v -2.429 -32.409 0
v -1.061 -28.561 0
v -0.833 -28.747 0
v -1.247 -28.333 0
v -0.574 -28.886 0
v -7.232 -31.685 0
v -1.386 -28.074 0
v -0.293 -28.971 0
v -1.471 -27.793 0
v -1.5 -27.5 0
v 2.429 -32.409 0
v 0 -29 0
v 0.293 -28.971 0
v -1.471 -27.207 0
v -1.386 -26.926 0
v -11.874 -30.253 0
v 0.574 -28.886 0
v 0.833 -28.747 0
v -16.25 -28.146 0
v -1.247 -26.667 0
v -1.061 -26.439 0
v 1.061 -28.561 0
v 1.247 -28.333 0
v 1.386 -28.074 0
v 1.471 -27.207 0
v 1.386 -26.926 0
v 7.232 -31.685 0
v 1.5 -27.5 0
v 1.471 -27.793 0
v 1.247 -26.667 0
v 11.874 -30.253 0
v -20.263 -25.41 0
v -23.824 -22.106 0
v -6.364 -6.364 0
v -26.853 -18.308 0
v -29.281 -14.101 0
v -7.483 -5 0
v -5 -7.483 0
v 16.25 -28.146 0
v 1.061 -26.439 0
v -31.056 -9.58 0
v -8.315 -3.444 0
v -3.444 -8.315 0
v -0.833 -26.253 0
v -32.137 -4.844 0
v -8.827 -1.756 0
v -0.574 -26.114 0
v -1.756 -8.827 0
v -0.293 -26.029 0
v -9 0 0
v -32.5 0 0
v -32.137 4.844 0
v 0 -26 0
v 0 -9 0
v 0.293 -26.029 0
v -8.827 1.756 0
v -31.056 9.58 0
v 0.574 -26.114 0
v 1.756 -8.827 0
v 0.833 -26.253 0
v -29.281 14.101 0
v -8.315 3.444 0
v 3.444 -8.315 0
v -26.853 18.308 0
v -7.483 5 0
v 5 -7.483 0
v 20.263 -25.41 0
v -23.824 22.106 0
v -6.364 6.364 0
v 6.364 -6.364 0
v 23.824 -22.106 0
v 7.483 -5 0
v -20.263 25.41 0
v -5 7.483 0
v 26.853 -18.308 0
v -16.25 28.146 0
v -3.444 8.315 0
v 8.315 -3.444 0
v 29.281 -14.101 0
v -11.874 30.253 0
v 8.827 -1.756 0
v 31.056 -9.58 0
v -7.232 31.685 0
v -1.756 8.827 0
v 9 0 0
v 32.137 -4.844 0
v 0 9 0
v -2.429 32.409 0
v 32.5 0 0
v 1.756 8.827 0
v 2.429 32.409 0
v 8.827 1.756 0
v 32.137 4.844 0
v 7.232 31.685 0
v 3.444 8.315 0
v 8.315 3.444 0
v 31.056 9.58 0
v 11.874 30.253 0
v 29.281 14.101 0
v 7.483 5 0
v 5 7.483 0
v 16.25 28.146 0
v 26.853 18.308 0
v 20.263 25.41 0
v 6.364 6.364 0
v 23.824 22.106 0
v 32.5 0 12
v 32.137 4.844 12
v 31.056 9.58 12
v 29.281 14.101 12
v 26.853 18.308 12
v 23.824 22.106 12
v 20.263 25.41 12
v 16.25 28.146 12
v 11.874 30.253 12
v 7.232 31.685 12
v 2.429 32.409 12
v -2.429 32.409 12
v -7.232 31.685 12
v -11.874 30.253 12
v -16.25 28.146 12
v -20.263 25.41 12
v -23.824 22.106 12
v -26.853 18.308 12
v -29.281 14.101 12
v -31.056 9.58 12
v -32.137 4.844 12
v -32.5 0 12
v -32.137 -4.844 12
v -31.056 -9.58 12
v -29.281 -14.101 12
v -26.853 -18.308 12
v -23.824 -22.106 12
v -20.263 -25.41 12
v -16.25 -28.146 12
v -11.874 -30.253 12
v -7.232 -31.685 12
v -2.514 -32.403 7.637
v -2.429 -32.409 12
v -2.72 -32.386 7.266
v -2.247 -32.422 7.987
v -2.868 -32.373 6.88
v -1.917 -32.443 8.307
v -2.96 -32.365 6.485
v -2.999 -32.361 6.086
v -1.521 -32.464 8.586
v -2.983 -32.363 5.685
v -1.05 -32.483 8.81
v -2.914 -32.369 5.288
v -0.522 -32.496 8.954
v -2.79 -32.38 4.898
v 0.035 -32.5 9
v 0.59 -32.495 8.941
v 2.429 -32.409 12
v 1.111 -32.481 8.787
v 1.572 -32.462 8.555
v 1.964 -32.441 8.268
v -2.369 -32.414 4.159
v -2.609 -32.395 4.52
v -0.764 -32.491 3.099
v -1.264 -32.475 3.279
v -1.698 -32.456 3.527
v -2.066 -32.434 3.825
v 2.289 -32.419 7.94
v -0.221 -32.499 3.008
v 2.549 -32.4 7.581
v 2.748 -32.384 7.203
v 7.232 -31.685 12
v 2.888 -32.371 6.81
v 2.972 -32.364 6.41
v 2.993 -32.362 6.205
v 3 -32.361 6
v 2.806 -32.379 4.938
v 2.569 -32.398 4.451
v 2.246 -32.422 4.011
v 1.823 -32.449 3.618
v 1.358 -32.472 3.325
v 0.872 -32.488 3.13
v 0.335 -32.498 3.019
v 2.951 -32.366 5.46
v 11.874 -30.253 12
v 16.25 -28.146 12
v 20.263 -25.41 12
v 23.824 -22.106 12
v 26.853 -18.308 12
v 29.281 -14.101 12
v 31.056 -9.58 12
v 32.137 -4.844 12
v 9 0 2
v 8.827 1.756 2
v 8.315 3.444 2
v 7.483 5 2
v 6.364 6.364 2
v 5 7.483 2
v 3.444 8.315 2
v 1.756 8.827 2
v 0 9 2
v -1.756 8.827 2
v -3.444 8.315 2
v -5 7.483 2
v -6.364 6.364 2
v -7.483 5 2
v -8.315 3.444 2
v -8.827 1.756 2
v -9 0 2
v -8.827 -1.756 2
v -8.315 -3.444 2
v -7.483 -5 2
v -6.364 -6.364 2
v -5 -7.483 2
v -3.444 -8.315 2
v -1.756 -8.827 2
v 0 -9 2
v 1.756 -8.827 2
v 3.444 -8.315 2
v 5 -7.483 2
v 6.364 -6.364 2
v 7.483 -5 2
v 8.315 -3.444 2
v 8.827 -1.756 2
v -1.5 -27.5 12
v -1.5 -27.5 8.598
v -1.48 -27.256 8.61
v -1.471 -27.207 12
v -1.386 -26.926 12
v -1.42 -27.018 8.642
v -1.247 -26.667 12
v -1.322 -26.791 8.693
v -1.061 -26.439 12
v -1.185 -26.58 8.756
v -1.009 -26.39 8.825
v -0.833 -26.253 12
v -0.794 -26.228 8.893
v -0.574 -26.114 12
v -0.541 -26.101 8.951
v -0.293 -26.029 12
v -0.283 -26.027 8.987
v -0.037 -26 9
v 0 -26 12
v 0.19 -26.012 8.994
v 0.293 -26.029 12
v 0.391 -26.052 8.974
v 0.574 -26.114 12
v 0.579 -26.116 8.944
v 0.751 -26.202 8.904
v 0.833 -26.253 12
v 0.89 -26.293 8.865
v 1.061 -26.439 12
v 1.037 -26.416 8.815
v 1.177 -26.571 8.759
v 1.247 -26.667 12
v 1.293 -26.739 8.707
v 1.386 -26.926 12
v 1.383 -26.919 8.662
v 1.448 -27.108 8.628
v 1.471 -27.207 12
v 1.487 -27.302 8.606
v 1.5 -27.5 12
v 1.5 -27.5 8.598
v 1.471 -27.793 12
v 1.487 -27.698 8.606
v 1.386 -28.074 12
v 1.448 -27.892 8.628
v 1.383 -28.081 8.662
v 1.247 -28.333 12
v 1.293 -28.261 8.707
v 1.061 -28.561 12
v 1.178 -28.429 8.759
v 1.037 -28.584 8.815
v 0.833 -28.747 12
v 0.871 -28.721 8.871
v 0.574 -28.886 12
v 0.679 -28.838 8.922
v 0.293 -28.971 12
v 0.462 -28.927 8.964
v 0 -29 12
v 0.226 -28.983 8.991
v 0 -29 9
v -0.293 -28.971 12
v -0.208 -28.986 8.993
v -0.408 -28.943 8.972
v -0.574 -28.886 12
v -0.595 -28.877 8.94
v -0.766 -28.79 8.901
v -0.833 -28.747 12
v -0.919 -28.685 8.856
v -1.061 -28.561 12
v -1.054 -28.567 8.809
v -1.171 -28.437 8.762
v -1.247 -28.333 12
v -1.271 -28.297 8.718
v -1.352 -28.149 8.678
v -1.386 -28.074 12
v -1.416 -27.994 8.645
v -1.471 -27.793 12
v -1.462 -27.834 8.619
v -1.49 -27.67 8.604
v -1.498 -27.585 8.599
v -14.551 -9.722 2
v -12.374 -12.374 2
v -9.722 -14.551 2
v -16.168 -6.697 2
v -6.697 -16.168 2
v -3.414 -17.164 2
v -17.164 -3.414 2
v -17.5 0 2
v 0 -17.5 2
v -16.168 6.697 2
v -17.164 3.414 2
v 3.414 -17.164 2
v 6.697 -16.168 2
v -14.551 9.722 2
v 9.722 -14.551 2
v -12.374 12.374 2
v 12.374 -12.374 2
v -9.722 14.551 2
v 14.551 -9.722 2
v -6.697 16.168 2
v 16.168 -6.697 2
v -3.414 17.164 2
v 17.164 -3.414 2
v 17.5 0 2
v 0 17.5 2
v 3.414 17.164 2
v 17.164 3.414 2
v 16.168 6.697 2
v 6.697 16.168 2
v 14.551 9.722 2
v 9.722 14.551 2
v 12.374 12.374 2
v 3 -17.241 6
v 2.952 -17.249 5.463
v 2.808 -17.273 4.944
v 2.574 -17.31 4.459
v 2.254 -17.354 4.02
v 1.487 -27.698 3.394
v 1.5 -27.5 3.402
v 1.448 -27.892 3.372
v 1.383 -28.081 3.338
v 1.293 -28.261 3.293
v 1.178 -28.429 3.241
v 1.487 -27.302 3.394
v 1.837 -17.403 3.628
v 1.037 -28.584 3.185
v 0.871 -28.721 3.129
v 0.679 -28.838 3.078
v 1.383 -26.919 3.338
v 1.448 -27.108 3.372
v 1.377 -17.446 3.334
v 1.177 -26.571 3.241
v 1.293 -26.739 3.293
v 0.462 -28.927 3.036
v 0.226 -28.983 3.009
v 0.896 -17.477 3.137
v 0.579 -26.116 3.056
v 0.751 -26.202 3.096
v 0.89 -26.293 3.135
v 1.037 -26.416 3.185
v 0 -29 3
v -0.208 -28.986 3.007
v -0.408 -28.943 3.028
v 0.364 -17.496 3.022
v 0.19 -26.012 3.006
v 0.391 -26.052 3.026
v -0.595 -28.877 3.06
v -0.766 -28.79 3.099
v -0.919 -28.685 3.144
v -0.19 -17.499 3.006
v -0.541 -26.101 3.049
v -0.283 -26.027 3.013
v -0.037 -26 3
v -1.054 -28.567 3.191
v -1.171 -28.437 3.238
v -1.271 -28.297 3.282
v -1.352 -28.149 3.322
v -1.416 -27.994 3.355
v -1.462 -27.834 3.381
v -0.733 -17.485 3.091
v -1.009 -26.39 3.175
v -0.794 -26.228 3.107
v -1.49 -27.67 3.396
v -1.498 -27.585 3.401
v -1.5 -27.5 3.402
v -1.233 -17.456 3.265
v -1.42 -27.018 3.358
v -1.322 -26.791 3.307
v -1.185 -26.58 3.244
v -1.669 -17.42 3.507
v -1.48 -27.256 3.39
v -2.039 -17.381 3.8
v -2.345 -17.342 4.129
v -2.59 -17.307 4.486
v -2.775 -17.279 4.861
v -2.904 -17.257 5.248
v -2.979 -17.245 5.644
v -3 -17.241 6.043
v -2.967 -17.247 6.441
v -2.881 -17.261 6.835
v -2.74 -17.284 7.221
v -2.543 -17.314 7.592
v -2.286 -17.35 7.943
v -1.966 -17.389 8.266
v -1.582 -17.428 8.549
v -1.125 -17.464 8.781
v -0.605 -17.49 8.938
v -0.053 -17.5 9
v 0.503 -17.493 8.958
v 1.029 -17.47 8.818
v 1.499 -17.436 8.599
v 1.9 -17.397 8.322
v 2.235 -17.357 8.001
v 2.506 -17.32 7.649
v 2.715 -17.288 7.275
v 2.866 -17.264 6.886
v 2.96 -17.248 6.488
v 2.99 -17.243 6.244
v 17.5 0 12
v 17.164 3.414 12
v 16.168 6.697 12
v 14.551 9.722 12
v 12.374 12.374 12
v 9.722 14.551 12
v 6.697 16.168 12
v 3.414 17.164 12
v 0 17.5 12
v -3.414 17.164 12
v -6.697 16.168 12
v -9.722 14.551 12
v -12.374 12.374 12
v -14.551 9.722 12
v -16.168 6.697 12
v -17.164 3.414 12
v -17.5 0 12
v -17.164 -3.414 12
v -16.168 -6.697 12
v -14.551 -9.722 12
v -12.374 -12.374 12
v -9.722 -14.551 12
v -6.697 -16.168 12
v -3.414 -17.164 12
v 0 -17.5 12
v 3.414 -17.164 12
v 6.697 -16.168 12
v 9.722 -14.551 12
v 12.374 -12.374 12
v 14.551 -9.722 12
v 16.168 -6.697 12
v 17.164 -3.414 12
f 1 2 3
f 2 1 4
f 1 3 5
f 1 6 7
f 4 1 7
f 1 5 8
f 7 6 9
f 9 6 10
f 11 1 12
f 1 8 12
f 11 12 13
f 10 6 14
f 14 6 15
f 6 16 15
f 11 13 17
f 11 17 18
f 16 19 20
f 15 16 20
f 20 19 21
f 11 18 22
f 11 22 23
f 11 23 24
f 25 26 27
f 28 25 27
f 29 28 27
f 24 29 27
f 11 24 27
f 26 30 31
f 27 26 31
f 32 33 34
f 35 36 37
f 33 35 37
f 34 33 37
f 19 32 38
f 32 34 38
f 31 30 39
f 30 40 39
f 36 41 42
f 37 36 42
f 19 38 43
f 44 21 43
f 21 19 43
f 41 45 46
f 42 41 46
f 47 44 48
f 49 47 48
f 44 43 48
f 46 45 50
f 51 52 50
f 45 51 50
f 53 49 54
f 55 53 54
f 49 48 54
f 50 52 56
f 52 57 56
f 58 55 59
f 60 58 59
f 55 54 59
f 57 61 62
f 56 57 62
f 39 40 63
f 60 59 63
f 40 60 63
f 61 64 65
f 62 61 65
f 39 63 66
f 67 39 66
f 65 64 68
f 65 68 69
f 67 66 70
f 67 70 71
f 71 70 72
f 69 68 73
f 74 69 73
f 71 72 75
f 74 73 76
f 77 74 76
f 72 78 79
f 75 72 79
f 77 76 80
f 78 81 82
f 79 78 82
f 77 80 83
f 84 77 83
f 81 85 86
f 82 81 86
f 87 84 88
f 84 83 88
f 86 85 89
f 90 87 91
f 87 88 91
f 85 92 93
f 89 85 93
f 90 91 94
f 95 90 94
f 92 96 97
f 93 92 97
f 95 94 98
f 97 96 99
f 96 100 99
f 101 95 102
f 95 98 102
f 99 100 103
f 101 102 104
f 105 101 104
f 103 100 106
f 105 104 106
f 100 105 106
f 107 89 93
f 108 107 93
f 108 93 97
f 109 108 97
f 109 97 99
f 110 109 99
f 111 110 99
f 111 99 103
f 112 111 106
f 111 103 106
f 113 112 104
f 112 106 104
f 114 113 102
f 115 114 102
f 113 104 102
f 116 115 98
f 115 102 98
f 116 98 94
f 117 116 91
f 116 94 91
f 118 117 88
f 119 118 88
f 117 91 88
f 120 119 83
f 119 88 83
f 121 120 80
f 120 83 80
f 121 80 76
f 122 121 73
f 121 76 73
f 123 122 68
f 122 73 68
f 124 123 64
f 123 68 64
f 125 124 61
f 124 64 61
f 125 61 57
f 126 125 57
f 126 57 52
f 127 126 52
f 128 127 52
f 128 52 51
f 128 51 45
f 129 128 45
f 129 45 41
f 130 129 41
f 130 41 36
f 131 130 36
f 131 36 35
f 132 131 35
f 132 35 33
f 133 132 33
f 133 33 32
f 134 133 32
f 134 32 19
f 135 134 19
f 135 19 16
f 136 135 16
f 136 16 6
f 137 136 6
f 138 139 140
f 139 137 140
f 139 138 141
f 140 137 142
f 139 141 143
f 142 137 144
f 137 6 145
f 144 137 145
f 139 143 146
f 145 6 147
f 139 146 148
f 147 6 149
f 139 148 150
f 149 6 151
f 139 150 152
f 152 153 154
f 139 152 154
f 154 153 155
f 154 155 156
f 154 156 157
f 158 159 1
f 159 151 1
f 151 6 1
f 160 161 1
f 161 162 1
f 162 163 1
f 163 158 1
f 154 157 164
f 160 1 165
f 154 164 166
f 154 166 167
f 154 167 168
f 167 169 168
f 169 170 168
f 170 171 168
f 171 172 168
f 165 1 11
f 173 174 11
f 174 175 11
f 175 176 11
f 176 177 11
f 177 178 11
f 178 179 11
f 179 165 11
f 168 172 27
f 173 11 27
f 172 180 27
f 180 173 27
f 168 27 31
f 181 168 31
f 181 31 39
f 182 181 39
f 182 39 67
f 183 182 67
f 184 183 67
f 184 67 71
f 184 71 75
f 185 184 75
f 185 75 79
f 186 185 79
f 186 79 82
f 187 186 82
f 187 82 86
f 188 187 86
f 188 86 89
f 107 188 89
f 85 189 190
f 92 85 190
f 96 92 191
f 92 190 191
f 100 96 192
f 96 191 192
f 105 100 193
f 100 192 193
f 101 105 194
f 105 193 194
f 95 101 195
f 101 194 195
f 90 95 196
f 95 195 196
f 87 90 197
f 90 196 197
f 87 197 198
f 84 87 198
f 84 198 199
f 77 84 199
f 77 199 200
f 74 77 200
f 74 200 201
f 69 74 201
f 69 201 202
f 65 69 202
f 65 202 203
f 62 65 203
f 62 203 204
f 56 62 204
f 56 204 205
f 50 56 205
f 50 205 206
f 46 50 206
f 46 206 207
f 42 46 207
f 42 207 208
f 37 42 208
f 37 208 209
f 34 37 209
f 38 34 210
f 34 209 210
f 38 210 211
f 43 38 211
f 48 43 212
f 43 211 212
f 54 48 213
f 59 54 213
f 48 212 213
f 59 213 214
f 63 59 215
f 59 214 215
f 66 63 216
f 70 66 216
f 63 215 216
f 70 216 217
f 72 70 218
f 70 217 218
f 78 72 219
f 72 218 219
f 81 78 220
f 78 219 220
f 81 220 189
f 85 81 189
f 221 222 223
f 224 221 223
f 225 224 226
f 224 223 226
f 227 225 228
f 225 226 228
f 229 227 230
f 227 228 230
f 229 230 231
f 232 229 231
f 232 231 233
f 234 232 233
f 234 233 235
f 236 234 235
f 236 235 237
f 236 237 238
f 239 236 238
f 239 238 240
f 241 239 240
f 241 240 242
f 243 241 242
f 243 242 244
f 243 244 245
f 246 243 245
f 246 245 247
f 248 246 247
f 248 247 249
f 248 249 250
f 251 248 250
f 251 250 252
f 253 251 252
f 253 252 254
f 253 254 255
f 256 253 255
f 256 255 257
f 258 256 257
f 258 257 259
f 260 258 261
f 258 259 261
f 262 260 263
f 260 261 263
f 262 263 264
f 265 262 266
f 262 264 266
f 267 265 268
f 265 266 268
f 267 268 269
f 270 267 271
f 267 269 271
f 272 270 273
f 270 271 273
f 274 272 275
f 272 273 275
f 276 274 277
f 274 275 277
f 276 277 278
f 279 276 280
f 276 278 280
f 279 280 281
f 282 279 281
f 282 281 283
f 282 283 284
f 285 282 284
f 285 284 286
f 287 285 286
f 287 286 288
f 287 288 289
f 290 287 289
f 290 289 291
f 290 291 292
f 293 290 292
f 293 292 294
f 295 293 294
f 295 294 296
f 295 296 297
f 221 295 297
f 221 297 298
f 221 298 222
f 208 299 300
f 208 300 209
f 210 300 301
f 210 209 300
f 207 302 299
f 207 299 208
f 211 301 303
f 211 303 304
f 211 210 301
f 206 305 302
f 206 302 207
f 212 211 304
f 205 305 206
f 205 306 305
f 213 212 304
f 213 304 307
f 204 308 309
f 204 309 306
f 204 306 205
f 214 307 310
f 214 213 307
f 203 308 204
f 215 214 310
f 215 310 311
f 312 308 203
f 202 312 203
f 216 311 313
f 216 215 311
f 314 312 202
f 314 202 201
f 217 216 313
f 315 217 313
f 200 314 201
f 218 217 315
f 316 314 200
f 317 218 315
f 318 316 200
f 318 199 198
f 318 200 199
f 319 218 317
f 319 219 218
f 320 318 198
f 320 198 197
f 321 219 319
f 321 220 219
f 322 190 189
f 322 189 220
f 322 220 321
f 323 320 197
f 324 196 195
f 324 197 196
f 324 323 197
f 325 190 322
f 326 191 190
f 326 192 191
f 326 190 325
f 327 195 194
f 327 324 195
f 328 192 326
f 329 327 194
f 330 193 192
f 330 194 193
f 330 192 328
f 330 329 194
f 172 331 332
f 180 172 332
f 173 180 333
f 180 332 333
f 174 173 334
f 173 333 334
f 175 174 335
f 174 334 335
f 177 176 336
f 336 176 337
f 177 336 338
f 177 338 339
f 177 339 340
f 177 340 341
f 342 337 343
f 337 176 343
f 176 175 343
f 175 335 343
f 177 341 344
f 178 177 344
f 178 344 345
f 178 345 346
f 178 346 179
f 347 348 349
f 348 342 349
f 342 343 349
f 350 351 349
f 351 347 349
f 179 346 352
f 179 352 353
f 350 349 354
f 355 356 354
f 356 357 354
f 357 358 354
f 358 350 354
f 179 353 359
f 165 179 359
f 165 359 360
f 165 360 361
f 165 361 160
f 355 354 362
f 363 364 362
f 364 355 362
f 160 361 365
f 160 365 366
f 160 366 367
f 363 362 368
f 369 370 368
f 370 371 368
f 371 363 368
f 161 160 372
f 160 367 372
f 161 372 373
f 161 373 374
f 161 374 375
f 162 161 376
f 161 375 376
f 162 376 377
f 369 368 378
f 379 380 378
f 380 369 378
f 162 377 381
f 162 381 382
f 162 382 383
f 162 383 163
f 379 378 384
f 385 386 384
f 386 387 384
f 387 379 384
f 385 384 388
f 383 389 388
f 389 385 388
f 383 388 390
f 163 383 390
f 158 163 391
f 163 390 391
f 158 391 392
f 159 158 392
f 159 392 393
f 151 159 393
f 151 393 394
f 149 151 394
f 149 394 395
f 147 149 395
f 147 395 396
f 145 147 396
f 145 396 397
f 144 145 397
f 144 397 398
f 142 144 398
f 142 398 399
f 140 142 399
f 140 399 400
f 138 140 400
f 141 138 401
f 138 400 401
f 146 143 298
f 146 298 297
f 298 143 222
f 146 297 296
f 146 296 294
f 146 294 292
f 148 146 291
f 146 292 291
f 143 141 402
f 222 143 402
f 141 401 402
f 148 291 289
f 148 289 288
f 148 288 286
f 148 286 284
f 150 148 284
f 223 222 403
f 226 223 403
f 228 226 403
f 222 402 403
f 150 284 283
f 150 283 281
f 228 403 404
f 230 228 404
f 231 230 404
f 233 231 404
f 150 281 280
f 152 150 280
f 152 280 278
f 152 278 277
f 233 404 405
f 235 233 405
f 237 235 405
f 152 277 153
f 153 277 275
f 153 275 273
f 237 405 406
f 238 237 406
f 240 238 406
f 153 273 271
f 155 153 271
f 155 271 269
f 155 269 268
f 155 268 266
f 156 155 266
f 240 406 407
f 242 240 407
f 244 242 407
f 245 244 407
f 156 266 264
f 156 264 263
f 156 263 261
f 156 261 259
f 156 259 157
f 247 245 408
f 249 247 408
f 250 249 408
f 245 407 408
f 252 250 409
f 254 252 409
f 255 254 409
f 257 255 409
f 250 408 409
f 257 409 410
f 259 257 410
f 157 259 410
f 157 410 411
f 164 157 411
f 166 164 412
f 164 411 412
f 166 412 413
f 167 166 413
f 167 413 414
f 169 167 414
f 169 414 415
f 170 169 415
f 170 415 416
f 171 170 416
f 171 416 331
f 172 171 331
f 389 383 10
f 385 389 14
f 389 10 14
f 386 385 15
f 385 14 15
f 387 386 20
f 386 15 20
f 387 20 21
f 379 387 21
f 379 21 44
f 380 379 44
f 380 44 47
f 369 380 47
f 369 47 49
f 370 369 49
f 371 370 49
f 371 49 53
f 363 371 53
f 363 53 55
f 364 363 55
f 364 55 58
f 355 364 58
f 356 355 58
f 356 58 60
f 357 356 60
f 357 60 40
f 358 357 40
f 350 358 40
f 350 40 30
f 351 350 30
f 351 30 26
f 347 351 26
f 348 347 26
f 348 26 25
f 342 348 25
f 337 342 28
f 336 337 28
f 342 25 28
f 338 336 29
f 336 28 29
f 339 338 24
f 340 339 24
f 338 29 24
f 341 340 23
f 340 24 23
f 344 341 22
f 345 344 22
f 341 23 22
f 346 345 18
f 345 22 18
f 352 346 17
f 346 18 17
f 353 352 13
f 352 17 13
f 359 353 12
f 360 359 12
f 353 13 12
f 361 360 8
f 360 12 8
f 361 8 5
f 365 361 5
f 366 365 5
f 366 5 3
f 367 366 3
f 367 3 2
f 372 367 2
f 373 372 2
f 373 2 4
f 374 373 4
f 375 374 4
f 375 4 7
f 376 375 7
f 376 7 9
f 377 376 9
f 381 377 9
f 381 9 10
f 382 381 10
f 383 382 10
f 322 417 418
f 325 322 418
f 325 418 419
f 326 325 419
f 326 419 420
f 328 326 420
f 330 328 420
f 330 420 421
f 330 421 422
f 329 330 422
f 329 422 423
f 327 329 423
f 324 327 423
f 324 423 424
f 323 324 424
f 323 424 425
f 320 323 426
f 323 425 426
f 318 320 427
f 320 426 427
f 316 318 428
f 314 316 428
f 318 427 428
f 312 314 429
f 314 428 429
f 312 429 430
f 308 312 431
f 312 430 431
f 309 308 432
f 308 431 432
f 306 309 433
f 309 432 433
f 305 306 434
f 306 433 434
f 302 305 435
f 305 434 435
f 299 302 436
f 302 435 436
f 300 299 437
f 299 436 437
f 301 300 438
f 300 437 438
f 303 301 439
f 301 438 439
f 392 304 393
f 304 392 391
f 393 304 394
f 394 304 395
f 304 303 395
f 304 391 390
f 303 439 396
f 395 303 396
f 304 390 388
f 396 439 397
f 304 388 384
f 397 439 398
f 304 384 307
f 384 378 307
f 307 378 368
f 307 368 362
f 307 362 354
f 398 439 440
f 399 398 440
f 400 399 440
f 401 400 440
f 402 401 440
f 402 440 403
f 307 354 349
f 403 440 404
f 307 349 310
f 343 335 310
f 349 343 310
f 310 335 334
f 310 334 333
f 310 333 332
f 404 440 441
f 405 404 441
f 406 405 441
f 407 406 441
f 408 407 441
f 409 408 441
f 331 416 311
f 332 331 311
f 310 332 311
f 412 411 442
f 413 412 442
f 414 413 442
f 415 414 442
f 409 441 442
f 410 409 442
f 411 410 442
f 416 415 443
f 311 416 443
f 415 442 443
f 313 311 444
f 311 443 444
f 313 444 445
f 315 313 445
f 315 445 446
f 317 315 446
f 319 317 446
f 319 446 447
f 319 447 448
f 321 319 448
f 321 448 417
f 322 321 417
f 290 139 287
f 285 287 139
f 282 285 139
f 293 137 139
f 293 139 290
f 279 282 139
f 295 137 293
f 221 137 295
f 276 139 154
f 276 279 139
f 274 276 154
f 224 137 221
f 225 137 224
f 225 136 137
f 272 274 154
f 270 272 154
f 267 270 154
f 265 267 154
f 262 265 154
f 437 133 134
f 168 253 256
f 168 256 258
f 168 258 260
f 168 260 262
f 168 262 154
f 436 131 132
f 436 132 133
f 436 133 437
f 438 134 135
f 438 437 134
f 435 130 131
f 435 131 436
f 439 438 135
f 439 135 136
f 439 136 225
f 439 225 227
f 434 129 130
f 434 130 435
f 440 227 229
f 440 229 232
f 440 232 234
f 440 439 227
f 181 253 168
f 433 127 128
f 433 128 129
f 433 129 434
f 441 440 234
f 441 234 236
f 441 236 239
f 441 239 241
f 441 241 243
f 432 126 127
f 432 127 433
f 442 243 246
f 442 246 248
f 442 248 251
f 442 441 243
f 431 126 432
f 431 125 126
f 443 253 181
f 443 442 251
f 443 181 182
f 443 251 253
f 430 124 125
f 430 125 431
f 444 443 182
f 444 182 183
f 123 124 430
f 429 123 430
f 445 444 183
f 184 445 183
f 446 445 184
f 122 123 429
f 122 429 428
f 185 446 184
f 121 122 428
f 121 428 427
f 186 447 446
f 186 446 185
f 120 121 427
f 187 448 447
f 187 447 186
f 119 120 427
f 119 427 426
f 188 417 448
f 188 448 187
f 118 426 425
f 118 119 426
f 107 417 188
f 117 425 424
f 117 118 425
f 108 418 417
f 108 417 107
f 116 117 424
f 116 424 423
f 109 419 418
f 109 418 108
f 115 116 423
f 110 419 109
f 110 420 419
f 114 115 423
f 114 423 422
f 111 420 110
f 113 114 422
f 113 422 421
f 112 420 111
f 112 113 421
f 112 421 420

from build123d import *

# Parameters (mm, degrees)
F0_R     = 32.5
F1_DEPTH = 12
F2_R     = 17.5
F3_DEPTH = 10
F4_R     = 9
F5_DEPTH = 2000
F7_D     = 6
F7_DEPTH = 32.501
F9_D     = 3


with BuildPart() as f1:
    # F0 (on Top) → F1 (new body)
    with BuildSketch(Plane.XY):
        Circle(F0_R)
    extrude(amount=F1_DEPTH)

    # F2 (on face) → F3 (cut)
    with BuildSketch(Plane.XY.offset(12)):
        Circle(F2_R)
    extrude(amount=-F3_DEPTH, mode=Mode.SUBTRACT)

    # F4 (on face) → F5 (cut)
    with BuildSketch(Plane.XY.offset(2)):
        Circle(F4_R)
    extrude(amount=-F5_DEPTH, mode=Mode.SUBTRACT)

    # F7 (through all, one way)
    with BuildSketch(Plane(origin=(0, 0, 0), x_dir=(1, 0, 0), z_dir=(0, 1, 0))):
        with Locations((0, -6)):
            Circle(F7_D / 2)
    extrude(amount=-F7_DEPTH, mode=Mode.SUBTRACT)

    # F9 (through all)
    with Locations(Plane.XY.offset(12)):
        with Locations((0, -27.5)):
            Hole(F9_D / 2)


solid = f1.part
